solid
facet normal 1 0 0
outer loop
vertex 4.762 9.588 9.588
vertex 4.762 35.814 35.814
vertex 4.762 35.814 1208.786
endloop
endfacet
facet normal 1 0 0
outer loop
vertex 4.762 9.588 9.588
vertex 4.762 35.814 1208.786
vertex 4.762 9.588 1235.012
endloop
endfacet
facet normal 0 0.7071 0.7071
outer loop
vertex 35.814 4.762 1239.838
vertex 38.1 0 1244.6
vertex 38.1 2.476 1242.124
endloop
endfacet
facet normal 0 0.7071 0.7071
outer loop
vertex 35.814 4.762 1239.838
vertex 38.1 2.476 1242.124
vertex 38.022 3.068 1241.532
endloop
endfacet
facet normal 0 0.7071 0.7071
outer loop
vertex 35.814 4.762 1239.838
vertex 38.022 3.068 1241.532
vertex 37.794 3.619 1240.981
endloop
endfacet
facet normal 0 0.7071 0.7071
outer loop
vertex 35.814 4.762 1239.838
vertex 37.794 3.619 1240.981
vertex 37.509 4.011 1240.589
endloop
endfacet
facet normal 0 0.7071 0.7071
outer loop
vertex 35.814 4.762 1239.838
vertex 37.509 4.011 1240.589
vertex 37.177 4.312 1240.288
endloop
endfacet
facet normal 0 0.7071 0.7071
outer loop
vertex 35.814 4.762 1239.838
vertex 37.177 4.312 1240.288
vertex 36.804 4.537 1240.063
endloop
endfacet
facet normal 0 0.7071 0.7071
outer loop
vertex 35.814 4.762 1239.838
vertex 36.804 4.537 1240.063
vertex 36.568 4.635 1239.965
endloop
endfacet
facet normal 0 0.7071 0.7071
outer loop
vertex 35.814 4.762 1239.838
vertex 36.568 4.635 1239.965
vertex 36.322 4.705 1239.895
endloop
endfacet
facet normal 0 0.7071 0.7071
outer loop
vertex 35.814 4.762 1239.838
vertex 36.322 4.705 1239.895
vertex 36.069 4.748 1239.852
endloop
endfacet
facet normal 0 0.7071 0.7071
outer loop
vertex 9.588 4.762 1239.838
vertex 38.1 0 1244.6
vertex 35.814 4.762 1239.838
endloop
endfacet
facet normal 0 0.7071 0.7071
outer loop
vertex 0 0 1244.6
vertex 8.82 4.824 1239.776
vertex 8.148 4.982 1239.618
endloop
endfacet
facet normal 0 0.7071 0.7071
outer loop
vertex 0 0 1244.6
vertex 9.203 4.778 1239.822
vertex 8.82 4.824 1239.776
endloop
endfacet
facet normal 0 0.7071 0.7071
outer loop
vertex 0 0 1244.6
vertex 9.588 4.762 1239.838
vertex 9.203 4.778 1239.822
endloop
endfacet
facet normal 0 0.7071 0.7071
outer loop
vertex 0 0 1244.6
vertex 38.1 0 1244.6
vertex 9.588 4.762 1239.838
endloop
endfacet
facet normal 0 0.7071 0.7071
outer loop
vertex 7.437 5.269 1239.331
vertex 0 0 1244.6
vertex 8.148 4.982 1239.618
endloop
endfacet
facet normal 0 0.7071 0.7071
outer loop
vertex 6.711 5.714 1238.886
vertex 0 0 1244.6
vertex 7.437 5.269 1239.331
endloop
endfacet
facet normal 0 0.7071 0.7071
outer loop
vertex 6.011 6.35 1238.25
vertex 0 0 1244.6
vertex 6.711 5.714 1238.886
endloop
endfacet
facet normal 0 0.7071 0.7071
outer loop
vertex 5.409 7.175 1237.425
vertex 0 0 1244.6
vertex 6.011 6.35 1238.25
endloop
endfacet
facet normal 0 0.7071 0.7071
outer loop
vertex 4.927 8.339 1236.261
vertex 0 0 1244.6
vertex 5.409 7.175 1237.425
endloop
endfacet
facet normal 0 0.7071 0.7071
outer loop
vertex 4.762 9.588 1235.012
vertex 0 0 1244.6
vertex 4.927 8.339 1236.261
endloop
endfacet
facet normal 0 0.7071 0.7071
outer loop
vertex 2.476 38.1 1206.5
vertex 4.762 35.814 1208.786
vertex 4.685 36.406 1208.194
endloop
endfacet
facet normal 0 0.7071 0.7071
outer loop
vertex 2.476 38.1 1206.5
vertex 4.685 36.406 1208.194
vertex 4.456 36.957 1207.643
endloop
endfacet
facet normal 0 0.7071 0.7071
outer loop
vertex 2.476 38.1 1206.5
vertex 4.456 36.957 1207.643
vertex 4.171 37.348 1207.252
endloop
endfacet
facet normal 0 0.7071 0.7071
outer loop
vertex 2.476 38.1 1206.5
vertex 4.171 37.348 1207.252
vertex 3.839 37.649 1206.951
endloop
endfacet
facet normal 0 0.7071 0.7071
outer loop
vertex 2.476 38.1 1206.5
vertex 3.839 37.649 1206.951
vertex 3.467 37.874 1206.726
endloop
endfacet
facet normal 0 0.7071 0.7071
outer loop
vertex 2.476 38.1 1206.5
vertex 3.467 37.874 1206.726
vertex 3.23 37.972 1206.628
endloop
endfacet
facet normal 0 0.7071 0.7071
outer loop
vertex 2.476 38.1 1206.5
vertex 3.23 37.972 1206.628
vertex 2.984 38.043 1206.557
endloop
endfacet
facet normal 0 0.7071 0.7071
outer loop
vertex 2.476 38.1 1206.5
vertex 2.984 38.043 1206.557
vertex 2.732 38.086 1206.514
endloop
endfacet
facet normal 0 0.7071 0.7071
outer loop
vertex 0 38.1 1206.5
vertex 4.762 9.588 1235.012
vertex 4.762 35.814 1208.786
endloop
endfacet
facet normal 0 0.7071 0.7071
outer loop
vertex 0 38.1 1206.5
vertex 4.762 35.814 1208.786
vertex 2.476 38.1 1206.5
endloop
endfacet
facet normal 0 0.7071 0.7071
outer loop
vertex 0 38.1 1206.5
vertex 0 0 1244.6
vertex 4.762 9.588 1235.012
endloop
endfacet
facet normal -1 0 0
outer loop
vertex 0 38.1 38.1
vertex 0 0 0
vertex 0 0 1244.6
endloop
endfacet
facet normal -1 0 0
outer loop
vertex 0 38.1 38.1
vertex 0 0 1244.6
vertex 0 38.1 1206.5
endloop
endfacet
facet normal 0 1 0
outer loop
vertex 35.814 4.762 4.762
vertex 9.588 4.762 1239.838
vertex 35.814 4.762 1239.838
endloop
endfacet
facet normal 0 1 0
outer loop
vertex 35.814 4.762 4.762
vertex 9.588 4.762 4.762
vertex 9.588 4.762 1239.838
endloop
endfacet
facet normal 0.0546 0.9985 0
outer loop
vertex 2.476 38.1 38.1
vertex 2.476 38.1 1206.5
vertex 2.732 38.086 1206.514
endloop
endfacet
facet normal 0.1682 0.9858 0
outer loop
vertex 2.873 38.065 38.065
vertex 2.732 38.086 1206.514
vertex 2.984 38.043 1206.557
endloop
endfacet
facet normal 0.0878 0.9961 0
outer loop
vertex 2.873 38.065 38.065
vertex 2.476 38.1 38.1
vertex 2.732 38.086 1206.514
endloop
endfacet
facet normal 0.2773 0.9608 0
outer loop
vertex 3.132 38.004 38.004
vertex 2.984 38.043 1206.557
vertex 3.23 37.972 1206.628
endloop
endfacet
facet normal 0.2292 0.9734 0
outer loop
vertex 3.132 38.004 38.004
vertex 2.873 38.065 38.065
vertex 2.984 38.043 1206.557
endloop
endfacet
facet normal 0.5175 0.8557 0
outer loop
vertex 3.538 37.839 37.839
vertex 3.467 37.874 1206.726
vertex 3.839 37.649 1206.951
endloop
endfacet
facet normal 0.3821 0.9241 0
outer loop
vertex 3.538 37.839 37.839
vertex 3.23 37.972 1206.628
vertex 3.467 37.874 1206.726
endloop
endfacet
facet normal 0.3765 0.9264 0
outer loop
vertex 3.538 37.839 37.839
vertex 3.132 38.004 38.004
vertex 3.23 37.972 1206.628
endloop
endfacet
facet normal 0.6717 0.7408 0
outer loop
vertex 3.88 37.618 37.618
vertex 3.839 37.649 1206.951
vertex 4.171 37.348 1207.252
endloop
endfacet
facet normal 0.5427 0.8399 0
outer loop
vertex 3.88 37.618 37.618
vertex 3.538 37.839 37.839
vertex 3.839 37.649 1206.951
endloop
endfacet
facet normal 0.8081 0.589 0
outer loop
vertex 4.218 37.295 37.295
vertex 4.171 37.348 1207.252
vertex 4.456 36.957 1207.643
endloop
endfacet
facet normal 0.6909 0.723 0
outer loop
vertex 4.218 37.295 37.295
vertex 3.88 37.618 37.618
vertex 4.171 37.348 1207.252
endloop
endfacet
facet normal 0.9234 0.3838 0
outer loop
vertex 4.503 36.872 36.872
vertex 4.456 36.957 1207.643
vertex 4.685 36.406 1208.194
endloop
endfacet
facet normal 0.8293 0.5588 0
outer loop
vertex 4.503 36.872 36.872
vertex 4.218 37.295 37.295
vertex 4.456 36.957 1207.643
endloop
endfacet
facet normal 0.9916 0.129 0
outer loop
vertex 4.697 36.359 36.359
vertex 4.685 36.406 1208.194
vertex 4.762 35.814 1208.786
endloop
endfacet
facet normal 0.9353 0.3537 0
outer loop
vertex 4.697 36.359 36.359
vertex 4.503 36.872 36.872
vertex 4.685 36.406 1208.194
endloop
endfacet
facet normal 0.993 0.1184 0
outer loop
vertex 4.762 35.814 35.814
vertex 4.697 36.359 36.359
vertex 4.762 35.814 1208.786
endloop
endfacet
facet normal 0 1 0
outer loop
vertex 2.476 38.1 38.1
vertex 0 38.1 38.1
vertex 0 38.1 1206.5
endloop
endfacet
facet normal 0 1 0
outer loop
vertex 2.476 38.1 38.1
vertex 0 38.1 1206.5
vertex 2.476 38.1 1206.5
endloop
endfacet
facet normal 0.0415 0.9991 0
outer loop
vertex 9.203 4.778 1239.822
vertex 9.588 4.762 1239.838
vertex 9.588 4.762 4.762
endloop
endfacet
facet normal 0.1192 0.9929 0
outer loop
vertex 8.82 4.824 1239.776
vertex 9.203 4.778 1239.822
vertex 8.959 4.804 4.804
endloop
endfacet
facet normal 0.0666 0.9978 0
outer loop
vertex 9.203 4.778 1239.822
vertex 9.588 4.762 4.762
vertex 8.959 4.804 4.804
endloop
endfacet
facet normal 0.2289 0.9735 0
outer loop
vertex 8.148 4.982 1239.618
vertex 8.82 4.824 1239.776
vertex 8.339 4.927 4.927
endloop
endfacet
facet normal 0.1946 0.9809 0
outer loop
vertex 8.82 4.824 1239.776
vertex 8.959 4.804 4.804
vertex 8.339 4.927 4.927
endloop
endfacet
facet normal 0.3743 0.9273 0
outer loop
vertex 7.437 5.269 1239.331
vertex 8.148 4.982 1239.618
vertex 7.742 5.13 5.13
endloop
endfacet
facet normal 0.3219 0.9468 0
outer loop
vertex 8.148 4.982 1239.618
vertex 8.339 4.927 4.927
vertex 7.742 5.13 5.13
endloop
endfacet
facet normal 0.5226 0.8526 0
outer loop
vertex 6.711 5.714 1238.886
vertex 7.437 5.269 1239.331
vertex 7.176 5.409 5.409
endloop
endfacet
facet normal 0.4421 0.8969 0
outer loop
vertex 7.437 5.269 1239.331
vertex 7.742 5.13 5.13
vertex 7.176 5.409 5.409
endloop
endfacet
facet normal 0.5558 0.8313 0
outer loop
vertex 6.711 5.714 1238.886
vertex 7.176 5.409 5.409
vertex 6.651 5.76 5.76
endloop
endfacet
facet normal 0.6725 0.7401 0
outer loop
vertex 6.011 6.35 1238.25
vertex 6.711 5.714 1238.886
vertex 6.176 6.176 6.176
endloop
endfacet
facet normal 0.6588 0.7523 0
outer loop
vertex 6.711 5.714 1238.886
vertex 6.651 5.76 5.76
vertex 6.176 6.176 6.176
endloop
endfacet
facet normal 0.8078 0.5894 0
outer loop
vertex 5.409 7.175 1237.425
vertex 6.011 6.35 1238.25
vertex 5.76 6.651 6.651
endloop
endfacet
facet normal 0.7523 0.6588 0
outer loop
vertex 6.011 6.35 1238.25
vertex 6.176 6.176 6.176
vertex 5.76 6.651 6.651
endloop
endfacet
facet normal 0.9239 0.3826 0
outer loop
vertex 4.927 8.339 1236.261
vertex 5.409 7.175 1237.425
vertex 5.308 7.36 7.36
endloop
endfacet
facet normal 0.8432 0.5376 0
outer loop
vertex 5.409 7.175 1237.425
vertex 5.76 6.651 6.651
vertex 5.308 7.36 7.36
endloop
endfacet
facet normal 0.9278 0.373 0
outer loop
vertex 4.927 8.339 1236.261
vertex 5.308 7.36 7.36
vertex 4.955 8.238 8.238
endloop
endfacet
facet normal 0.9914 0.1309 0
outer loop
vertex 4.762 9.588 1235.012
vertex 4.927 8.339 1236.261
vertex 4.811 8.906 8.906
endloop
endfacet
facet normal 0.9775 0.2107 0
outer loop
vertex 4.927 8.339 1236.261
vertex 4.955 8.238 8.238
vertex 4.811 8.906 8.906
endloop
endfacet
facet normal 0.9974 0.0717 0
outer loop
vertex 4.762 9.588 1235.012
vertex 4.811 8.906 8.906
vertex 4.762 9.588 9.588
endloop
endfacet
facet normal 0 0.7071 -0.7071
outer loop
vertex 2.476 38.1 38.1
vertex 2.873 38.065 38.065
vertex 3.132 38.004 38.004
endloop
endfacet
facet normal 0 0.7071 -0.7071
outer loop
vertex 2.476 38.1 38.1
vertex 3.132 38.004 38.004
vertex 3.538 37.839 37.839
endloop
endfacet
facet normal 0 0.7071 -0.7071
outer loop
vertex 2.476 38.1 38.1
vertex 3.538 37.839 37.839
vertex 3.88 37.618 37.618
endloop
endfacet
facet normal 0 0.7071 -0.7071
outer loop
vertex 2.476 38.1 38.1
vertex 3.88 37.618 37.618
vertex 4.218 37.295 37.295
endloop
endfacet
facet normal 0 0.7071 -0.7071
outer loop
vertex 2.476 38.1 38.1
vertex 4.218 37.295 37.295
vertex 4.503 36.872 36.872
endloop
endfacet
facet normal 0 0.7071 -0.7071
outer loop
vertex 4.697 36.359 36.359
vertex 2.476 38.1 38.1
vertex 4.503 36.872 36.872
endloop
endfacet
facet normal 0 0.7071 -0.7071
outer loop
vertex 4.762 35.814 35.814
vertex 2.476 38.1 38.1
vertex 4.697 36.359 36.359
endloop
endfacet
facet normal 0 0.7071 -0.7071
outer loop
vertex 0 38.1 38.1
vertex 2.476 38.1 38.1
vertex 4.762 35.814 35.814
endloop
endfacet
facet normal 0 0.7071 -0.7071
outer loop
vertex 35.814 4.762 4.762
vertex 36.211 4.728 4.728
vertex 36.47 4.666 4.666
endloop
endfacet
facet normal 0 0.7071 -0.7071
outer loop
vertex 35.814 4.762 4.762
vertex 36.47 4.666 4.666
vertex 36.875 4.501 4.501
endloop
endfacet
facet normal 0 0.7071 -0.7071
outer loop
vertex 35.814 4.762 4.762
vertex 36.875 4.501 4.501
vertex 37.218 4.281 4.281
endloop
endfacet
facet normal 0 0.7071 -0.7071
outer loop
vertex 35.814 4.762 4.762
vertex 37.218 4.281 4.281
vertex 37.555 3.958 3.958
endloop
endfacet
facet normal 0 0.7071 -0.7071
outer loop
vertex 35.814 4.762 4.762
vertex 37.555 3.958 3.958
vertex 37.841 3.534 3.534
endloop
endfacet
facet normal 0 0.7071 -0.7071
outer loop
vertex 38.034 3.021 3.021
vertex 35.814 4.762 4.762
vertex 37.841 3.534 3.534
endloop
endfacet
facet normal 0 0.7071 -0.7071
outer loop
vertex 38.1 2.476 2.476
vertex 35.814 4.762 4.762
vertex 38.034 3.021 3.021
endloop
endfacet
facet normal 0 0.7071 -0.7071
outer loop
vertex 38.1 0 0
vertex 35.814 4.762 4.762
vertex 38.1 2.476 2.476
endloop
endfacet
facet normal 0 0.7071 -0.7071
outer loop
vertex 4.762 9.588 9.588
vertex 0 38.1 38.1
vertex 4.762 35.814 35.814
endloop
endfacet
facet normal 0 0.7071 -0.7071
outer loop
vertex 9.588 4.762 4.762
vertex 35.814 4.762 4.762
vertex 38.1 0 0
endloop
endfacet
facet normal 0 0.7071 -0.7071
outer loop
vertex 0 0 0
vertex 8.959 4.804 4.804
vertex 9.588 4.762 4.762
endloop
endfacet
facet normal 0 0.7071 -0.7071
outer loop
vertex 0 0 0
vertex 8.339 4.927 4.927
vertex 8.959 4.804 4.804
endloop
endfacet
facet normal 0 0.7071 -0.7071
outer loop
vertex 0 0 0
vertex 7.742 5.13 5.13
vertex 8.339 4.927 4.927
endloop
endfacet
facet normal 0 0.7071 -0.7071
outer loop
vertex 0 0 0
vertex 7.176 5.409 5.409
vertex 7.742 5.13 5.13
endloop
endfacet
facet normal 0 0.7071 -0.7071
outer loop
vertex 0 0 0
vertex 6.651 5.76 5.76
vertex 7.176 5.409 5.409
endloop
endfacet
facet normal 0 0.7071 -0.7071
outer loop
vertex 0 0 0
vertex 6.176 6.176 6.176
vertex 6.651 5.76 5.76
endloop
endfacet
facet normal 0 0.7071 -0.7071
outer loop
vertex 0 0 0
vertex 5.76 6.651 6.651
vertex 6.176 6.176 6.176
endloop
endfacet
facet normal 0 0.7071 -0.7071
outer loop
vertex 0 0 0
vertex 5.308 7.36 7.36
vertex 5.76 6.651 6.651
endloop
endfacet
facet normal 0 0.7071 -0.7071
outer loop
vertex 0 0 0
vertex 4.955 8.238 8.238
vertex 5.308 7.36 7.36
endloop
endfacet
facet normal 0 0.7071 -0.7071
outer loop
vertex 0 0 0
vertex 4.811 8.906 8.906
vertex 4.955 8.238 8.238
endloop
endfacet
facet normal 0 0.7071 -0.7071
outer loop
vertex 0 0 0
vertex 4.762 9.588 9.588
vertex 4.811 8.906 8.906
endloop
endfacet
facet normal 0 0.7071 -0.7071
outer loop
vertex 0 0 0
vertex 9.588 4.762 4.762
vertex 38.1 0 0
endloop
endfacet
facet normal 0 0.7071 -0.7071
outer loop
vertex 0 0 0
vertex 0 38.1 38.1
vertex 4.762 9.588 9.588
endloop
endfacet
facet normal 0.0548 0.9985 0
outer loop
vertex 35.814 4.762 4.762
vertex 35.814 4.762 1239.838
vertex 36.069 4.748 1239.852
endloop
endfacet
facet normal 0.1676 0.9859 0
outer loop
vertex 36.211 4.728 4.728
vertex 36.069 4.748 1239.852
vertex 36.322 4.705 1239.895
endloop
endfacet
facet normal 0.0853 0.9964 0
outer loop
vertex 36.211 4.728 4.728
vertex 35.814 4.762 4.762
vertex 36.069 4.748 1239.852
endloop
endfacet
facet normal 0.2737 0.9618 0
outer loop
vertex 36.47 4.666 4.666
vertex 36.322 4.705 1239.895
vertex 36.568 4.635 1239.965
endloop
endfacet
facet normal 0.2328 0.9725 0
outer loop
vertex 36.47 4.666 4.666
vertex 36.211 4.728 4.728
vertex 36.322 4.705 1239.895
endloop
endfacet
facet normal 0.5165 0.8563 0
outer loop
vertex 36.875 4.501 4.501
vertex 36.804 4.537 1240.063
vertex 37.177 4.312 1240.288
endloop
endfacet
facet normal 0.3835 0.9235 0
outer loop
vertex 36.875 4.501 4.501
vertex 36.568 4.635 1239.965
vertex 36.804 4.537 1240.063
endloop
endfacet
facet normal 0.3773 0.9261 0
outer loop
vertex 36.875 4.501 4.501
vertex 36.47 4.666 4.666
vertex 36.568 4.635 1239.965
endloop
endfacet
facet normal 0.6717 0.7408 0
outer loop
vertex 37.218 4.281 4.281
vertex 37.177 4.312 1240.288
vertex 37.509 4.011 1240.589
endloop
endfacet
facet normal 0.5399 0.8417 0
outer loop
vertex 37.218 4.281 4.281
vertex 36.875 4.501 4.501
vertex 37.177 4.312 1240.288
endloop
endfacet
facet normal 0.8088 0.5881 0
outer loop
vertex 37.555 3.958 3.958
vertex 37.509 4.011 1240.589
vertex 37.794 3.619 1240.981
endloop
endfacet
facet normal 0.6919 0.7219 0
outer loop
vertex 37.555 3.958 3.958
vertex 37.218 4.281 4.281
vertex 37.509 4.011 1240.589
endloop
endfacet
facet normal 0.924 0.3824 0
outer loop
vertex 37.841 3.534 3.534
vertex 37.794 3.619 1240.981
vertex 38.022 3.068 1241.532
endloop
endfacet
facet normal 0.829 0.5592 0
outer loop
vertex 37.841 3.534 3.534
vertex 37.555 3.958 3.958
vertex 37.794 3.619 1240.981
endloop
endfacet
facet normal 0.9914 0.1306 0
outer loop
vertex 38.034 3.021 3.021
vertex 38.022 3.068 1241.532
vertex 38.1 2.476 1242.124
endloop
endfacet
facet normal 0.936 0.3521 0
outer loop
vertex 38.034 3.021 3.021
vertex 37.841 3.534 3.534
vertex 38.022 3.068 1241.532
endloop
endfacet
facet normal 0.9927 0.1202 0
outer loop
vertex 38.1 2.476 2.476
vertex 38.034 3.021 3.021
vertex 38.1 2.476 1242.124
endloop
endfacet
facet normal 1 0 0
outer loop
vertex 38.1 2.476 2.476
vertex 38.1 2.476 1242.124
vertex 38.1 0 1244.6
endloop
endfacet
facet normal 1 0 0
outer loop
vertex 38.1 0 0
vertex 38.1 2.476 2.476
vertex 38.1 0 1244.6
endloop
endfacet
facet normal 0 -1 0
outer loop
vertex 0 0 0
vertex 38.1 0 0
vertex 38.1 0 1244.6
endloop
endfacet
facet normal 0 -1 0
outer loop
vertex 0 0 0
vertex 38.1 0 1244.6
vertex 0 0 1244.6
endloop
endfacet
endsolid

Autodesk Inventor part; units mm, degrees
ref_plane "Start plane" through (0, 0, 0) normal (0, 0, 1) x (1, 0, 0)
ref_plane "End plane" through (0, 0, 1244.6) normal (0, 0, 1) x (1, 0, 0)
sketch "Sketch" plane through (0, 0, 0) normal (0, 0, 1) x (1, 0, 0)
  line L0 (38.1, 0) -> (0, 0)
  line L1 (0, 0) -> (0, 38.1)
  line L2 (0, 38.1) -> (2.4765, 38.1)
  line L3 (4.7625, 35.814) -> (4.7625, 9.5885)
  line L4 (9.5885, 4.7625) -> (35.814, 4.7625)
  line L5 (38.1, 2.4765) -> (38.1, 0)
  line L6 (0, -11.0414) -> (0, 31.5385) construction
  line L7 (-11.0414, 0) -> (31.5385, 0) construction
  arc A0 (4.7625, 9.5885) -> (9.5885, 4.7625) centre (9.5885, 9.5885) ccw
  arc A1 (4.7625, 35.814) -> (2.4765, 38.1) centre (2.4765, 35.814) ccw
  arc A2 (38.1, 2.4765) -> (35.814, 4.7625) centre (35.814, 2.4765) ccw
  line L8 (0, 48.4964) -> (0, -20.9644) construction
  line L9 (-20.9644, 0) -> (48.4964, 0) construction
  point P0 (4.7625, 38.1)
  point P1 (4.7625, 4.7625)
  point P2 (38.1, 4.7625)
  dimension "d0" = 38.1
  dimension "d1" = 38.1
  dimension "d2" = 4.7625
  dimension "d3" = 4.7625
  dimension "d10" = 0
  dimension "d11" = 0
  dimension "d14" = 4.826
  dimension "d15" = 2.286
extrude "Body" add sketch "Sketch" along normal up to surface (1244.6 mm away) from surface at 0
sketch "Sketch3" plane through (0, 0, 0) normal (0, 0, 1) x (1, 0, 0)
  line L0 (0, 0) -> (10, 0)
ref_plane "Work Plane3" through (0, 0, 0) normal (0, -1, 0) x (1, 0, 0)
sketch "Sketch4" plane through (0, 0, 0) normal (0, -1, 0) x (1, 0, 0)
  line L0 (-2, 0) -> (12, 0)
  line L1 (-2, 1244.6) -> (12, 1244.6)
  dimension "d17" = 1244.6
ref_plane "Work Plane4" through (19.05, 0, 1244.6) normal (0, 0.7071, 0.7071) x (1, 0, 0)
split "Split1" plane through (19.05, 0, 1244.6) removes the side toward (0, 0.7071, 0.7071)
ref_plane "Work Plane5" through (19.05, 0, 0) normal (0, 0.7071, -0.7071) x (1, 0, 0)
split "Split2" plane through (19.05, 0, 0) removes the side toward (0, 0.7071, -0.7071)
equation "\"d0\" = G_H"
equation "\"d1\" = G_H"
equation "\"d2\" = G_T"
equation "\"d3\" = G_T"
equation "\"d14\" = G_IR"
equation "\"d15\" = G_ER"
equation "\"d4\" = G_L"
equation "\"G_H\" = 38.1"
equation "\"G_T\" = 4.7625"
equation "\"G_ER\" = 2.286"
equation "\"G_IR\" = 4.826"
equation "\"G_L\" = d17"
equation "\"ex\" = 0"
equation "\"G_OFFSET_START\" = 0"
equation "\"G_OFFSET_END\" = 0"
equation "\"d13\" = G_OFFSET_END + B_L"
equation "\"B_L\" = 1244.6"
properties part number "AISC - L 1.5 x 1.5 x 3/16 - 49" material "Aluminum 6061"
